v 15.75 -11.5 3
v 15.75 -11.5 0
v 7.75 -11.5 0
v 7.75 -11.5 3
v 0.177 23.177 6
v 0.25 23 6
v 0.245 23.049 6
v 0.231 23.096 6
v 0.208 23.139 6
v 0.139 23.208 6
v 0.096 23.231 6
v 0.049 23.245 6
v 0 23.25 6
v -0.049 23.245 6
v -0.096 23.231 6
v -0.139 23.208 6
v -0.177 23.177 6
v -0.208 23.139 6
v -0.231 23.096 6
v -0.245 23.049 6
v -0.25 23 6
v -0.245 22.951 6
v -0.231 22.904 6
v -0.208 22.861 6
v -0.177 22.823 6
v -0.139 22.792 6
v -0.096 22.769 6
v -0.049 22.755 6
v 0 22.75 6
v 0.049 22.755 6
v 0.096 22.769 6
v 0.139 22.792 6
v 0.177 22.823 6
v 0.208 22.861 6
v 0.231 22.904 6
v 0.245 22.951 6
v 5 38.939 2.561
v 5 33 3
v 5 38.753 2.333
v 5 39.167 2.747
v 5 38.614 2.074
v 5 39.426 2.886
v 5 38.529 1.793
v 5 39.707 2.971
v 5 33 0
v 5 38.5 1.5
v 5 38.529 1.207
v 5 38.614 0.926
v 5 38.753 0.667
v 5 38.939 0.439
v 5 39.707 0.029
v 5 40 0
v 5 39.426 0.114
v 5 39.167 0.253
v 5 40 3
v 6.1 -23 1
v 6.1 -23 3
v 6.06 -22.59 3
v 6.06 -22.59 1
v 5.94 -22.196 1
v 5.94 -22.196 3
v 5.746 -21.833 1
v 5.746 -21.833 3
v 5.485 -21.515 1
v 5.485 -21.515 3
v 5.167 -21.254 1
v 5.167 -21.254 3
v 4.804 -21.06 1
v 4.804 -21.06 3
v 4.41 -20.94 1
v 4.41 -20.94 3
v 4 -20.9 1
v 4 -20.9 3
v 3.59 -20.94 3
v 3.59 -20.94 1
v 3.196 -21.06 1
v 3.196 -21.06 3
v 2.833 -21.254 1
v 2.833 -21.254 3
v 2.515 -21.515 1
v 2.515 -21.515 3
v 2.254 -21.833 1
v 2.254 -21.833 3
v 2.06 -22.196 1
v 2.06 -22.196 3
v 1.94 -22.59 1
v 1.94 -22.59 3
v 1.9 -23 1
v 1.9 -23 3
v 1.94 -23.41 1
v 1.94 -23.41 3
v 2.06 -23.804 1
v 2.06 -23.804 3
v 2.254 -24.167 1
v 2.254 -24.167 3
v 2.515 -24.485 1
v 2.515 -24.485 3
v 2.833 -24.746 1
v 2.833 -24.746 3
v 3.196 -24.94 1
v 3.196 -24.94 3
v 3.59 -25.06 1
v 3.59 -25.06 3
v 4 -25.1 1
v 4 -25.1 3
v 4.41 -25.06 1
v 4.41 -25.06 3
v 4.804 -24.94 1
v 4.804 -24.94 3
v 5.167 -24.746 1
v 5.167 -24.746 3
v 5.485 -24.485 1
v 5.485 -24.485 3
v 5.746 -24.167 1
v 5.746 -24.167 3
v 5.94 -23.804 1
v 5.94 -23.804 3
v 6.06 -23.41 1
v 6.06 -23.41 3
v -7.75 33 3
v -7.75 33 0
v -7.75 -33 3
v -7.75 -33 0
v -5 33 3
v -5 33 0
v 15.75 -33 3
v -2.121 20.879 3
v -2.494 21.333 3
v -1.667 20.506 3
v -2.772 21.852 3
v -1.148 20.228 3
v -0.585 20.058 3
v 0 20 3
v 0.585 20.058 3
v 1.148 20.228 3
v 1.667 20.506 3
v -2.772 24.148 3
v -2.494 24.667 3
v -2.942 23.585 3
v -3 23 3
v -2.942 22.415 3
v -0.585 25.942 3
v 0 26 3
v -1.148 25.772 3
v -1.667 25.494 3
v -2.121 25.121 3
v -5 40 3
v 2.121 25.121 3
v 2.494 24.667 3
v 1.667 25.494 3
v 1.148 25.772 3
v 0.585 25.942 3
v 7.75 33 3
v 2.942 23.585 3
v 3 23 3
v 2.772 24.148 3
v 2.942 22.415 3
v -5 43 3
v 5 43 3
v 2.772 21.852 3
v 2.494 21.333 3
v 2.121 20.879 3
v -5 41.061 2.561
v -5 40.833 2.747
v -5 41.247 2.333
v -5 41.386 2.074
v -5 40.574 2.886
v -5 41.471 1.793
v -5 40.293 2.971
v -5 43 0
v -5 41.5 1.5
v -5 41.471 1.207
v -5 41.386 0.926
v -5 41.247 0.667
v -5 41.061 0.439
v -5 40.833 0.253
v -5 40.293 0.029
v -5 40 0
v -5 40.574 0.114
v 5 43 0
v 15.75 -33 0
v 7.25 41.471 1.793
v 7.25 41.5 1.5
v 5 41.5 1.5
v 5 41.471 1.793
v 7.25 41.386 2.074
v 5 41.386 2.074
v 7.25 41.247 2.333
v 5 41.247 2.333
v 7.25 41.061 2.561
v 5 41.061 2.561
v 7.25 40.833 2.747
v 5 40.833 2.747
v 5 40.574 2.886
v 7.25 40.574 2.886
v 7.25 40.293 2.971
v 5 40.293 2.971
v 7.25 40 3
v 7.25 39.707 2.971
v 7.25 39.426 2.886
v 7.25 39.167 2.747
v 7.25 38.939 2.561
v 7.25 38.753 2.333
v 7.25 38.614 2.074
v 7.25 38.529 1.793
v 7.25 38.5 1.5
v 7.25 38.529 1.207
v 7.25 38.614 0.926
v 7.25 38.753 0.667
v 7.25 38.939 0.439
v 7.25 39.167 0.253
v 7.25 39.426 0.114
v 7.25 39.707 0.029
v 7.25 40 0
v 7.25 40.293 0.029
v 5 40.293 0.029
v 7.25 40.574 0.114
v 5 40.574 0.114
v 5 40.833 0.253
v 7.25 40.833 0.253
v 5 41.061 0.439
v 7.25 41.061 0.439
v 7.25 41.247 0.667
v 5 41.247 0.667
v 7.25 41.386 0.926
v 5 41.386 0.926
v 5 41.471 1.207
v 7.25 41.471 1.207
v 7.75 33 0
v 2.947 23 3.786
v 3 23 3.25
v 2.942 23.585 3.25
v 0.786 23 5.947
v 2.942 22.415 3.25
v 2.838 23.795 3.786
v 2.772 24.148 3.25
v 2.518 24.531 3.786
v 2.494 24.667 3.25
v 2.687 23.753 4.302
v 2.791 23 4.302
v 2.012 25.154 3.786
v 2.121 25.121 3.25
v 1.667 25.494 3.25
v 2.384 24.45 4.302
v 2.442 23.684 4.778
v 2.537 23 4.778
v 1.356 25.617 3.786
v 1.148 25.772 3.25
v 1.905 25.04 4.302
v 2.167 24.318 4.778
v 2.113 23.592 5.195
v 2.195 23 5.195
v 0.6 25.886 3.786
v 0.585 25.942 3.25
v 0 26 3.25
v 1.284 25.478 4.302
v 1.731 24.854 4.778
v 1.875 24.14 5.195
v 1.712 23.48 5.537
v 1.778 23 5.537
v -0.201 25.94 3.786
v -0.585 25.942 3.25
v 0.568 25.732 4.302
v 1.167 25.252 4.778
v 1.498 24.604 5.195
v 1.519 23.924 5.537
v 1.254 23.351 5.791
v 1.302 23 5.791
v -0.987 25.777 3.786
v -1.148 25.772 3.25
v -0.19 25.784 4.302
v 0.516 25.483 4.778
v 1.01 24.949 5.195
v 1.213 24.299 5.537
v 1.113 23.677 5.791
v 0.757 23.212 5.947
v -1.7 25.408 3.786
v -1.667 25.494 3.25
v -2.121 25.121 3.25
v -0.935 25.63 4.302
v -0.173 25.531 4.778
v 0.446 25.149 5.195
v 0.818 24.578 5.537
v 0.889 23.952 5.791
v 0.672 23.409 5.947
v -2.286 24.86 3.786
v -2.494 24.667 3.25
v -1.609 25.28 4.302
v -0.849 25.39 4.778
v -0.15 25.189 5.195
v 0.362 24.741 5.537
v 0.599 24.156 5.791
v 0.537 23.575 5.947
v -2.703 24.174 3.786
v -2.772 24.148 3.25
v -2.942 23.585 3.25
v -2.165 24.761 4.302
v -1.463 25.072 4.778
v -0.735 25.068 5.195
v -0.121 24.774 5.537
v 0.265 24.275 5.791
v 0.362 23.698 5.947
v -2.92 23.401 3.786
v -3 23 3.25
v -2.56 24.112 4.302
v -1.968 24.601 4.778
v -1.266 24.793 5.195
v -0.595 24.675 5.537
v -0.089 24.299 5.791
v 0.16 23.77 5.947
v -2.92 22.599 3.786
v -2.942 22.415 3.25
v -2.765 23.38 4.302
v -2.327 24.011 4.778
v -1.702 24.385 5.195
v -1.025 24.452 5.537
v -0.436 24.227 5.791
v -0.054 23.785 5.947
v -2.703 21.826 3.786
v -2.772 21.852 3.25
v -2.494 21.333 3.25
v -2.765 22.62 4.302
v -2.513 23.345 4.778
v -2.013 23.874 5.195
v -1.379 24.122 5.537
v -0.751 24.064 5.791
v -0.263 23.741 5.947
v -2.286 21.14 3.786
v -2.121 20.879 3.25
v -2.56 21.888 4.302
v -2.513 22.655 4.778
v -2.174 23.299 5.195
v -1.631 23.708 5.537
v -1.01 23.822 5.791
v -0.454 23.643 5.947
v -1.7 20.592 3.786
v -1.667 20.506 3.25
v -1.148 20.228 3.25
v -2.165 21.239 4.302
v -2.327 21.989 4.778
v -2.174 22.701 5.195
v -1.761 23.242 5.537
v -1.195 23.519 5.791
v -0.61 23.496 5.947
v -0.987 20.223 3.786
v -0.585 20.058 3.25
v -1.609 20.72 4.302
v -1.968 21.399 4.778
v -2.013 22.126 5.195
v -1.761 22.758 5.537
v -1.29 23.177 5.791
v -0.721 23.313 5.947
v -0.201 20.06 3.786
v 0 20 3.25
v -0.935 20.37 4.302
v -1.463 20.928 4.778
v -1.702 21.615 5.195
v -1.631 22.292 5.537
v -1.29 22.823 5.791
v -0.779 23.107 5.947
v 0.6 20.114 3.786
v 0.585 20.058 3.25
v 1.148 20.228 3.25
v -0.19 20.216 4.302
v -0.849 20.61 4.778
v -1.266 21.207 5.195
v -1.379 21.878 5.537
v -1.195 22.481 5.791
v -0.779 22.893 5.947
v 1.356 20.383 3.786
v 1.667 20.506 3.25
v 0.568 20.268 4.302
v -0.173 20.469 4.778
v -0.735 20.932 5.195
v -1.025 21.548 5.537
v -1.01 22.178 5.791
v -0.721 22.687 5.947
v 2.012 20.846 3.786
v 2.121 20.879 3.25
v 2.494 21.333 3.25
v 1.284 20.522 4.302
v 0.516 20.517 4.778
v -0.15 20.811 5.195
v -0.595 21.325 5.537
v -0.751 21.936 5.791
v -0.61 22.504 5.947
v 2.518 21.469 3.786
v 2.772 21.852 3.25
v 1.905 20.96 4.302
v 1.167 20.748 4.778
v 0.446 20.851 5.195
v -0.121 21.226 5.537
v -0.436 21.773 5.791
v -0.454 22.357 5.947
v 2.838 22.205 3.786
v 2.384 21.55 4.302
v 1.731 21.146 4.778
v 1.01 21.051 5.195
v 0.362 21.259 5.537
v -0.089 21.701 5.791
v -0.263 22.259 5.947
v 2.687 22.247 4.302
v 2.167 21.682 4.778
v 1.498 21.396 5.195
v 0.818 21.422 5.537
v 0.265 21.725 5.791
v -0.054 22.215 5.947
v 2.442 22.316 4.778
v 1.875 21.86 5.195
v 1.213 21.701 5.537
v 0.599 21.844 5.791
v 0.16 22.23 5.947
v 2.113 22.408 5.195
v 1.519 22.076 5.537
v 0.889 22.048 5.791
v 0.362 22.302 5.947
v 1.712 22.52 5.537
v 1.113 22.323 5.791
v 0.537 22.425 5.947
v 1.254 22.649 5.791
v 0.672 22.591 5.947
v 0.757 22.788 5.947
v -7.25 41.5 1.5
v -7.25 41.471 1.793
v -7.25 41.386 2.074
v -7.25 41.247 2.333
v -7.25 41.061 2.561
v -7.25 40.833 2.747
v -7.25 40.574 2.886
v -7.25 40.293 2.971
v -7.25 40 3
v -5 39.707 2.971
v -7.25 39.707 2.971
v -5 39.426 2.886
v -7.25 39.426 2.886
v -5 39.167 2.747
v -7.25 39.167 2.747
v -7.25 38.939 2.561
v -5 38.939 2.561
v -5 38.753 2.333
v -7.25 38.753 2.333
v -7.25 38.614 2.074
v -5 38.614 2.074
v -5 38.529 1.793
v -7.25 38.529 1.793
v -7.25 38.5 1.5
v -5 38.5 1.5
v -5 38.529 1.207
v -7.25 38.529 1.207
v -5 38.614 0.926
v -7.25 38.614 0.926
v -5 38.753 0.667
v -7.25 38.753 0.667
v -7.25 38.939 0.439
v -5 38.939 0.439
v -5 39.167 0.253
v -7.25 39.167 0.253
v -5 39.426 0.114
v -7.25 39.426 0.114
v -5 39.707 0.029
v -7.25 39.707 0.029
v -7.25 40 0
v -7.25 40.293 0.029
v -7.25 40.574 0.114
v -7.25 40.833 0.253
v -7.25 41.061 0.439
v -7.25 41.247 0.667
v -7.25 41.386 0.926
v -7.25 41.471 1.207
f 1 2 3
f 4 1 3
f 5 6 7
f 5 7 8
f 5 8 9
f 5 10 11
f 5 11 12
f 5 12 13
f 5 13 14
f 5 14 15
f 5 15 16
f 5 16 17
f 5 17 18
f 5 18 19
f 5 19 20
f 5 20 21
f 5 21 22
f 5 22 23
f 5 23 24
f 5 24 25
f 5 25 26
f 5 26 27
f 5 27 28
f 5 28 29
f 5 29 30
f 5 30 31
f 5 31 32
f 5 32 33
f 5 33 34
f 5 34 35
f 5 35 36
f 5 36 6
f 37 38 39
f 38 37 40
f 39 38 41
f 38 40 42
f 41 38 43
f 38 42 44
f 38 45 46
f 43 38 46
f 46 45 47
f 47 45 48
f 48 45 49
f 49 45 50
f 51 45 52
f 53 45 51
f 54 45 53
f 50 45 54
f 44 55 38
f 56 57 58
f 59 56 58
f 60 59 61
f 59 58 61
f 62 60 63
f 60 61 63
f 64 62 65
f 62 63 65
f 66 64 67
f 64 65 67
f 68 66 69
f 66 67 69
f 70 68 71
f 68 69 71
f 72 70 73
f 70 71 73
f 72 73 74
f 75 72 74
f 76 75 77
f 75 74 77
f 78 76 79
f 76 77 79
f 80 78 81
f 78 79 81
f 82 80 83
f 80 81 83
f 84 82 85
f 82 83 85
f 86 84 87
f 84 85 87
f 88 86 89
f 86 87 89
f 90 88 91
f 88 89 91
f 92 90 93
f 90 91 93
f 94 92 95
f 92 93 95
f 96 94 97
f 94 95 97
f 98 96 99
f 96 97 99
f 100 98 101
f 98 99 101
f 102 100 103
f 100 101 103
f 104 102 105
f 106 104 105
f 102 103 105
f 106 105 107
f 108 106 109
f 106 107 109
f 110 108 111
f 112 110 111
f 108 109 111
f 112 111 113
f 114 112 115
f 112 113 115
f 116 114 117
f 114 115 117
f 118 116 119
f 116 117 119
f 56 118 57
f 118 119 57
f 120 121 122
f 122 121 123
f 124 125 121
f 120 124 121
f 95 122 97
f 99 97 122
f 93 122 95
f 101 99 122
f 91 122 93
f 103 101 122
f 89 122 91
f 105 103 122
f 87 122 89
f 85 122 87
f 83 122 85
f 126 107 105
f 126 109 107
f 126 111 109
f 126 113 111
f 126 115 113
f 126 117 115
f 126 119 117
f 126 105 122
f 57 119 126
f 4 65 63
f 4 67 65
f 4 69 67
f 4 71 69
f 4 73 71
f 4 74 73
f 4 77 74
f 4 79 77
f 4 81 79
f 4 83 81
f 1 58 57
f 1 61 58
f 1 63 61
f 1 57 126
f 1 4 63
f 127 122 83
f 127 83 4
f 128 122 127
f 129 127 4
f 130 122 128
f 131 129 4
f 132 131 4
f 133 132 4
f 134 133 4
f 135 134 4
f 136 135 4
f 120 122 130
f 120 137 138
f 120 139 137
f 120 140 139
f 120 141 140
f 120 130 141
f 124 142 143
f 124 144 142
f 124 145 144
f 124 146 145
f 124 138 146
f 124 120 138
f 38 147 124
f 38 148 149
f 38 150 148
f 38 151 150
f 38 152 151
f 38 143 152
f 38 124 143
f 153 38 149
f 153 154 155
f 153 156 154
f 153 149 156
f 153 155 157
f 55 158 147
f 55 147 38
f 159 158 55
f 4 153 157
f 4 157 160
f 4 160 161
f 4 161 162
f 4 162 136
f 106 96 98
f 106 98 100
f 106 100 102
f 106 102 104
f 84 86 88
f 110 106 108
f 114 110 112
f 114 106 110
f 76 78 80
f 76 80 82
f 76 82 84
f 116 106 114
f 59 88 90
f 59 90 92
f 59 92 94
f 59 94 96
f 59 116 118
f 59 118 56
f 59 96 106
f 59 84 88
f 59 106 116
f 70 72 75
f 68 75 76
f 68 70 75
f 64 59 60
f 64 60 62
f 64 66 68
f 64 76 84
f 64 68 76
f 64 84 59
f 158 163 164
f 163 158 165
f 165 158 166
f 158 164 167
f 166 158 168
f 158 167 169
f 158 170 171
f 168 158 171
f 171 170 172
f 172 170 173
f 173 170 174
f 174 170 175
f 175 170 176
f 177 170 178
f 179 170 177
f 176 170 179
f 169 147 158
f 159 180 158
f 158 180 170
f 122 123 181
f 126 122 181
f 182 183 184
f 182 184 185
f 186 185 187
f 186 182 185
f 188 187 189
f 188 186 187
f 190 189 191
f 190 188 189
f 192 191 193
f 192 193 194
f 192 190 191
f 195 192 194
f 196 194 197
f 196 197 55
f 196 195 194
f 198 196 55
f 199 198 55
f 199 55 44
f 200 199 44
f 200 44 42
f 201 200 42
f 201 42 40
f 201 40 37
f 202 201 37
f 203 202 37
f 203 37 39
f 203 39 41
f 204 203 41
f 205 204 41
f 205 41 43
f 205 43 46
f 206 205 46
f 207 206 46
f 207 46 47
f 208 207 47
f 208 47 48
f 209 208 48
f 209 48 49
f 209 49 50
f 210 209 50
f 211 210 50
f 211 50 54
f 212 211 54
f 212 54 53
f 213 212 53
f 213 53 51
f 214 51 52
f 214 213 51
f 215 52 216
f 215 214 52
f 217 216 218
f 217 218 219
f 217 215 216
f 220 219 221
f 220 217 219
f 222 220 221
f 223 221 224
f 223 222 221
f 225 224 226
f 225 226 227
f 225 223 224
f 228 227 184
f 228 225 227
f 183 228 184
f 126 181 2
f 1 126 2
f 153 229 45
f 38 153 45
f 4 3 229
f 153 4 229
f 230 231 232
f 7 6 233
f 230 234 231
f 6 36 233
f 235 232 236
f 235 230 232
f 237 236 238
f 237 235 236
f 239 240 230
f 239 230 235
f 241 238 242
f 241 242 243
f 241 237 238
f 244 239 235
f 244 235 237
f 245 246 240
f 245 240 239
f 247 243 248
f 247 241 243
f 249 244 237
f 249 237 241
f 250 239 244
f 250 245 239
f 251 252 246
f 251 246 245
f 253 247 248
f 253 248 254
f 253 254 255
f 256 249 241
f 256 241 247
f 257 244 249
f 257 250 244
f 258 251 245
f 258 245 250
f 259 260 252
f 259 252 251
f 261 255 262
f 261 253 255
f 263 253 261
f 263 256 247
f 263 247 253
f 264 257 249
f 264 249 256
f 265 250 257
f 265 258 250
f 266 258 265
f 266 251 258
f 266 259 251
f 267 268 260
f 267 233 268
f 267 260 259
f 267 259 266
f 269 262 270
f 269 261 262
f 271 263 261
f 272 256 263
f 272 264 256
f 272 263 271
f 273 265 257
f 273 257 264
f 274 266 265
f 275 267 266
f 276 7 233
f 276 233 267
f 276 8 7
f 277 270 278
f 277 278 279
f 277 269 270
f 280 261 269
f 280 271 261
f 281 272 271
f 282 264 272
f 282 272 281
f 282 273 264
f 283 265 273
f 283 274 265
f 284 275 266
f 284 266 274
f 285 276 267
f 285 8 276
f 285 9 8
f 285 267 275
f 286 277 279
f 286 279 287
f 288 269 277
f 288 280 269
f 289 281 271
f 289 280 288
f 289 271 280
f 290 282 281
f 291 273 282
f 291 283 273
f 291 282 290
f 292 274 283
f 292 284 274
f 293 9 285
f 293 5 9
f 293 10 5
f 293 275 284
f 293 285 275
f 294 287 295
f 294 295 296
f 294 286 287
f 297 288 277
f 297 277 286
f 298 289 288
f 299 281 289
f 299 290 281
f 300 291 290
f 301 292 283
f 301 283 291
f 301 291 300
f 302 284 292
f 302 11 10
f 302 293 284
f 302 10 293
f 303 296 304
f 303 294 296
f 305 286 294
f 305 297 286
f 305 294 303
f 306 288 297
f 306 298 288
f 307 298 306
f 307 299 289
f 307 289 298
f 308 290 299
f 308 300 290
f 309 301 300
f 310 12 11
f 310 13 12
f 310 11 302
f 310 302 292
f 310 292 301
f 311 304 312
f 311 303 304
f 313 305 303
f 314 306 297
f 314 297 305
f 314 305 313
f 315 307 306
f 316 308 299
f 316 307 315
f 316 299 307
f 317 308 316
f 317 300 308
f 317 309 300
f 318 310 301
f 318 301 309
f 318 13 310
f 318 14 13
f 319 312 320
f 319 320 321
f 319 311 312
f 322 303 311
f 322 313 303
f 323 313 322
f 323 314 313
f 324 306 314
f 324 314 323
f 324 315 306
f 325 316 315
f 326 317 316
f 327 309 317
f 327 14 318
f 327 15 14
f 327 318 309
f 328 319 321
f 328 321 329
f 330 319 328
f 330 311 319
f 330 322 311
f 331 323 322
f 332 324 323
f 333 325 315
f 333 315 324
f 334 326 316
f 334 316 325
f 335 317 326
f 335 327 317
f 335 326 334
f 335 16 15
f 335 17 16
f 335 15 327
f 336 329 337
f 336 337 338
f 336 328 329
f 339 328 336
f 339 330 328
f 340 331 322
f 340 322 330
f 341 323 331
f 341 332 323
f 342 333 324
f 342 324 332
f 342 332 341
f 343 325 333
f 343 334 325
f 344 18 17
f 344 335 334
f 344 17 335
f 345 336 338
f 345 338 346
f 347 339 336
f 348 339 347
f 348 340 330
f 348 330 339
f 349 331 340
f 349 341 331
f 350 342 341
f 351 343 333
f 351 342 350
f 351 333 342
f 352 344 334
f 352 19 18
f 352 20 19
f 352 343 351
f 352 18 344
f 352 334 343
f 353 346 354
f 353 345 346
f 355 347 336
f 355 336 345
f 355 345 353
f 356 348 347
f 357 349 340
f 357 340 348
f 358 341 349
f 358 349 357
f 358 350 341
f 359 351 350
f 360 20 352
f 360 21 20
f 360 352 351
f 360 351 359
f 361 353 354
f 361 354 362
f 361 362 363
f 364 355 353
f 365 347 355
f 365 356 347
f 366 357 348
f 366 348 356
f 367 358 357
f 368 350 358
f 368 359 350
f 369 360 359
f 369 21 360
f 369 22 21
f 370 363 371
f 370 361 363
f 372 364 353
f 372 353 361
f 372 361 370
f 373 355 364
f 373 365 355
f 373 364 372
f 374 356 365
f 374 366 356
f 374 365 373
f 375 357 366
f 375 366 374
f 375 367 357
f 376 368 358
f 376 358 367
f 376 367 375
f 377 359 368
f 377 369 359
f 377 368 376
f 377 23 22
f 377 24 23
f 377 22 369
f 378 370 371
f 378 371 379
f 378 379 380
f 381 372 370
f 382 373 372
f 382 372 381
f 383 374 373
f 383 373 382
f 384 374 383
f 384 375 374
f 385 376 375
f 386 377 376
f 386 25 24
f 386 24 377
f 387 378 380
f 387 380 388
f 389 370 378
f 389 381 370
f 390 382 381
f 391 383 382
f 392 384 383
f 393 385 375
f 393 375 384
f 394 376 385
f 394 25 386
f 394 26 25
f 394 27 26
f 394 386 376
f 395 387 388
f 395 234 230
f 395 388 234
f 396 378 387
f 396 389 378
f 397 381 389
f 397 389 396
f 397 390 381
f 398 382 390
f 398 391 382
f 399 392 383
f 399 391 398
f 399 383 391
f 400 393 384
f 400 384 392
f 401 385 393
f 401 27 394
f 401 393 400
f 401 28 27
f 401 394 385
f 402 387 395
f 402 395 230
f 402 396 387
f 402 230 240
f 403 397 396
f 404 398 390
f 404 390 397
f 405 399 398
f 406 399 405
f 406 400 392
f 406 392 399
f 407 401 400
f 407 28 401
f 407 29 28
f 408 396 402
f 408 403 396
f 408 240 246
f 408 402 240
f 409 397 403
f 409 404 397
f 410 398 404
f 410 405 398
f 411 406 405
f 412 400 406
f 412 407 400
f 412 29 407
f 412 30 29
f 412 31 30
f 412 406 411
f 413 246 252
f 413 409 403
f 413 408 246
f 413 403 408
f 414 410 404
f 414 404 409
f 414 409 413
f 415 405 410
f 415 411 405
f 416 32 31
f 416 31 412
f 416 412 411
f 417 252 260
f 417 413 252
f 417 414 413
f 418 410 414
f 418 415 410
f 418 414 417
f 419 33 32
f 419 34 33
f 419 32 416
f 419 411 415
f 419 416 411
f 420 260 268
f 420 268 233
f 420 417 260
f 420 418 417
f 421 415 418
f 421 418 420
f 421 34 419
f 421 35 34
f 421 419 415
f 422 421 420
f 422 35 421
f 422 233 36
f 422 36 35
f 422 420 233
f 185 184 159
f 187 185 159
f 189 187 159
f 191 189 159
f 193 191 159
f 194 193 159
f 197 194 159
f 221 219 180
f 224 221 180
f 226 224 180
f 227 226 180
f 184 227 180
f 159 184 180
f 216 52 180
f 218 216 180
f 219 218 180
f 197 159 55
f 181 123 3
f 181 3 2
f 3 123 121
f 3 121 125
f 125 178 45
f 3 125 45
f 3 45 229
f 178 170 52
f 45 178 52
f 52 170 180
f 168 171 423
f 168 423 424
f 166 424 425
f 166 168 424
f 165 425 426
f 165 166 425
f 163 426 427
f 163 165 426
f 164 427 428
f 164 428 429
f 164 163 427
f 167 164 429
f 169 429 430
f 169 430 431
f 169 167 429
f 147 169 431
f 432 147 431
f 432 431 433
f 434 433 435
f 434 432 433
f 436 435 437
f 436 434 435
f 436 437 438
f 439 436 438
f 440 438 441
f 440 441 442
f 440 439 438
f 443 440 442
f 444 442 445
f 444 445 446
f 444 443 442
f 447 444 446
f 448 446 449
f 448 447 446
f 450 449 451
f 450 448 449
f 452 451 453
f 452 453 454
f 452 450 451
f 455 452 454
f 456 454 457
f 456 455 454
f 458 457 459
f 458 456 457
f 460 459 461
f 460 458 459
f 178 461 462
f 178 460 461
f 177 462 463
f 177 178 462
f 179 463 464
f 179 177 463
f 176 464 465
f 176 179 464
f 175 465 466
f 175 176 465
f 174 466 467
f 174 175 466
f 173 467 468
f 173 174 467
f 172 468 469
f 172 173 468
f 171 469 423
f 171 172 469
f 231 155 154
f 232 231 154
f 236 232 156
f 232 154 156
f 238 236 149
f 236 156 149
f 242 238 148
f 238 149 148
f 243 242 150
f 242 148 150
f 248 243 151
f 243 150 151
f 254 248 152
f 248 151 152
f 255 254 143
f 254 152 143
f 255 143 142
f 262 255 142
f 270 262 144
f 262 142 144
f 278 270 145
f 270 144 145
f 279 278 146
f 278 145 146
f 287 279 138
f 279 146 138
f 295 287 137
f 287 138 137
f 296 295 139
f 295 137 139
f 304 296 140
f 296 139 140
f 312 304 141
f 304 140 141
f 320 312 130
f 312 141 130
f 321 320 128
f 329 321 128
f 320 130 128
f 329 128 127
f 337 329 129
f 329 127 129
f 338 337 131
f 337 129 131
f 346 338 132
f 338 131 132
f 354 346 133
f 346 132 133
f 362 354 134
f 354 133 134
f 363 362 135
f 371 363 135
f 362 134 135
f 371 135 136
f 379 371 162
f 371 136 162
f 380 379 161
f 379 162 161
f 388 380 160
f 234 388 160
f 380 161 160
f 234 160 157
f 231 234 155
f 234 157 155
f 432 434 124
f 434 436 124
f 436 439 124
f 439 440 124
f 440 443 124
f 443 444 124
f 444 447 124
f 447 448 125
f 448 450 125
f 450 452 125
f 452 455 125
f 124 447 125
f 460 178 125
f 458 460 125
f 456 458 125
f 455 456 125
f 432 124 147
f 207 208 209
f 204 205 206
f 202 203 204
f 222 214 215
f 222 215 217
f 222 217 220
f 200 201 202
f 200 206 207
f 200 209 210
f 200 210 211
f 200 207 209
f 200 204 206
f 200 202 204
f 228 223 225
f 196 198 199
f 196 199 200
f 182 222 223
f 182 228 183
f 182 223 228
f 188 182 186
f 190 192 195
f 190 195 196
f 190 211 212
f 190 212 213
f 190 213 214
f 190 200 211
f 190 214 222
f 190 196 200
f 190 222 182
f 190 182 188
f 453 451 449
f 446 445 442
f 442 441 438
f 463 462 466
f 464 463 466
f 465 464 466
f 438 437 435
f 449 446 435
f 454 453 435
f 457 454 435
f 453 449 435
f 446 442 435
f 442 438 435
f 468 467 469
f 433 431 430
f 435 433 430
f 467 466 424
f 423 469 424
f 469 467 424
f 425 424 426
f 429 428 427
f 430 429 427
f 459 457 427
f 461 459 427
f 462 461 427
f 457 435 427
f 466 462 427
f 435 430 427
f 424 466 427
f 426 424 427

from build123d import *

# Parameters (mm, degrees)
PAD_DEPTH    = 3
SKETCH001_R  = 1.5
PAD001_DEPTH = 7.25
SKETCH002_R  = 2.1
POCKET_DEPTH = 2
SKETCH003_R  = 3
PAD002_DEPTH = 3
FILLET_R     = 2.75


with BuildPart() as part:
    # Sketch → Pad (new body)
    with BuildSketch(Plane.XY):
        Polygon((-7.75, 33), (-7.75, -33), (15.75, -33), (15.75, -11.5), (7.75, -11.5), (7.75, 33), (5, 33), (5, 43), (-5, 43), (-5, 33), align=None)
    extrude(amount=PAD_DEPTH)

    # Sketch001 → Pad001 (join, symmetric)
    with BuildSketch(Plane.YZ):
        with Locations((40, 1.5)):
            Circle(SKETCH001_R)
    extrude(amount=PAD001_DEPTH, both=True)

    # Sketch002 (on Face5 of Pad001) → Pocket (cut)
    with BuildSketch(Plane.XY.offset(3)):
        with Locations((4, -23)):
            Circle(SKETCH002_R)
    extrude(amount=-POCKET_DEPTH, mode=Mode.SUBTRACT)

    # Sketch003 (on Face5 of Pocket) → Pad002 (join)
    with BuildSketch(Plane.XY.offset(3)):
        with Locations((0, 23)):
            Circle(SKETCH003_R)
    extrude(amount=PAD002_DEPTH)

    # Fillet
    fillet_edges = [part.edges().sort_by_distance(p)[0] for p in [
        (-3, 23, 6),
    ]]
    fillet(fillet_edges, radius=FILLET_R)


solid = part.part
